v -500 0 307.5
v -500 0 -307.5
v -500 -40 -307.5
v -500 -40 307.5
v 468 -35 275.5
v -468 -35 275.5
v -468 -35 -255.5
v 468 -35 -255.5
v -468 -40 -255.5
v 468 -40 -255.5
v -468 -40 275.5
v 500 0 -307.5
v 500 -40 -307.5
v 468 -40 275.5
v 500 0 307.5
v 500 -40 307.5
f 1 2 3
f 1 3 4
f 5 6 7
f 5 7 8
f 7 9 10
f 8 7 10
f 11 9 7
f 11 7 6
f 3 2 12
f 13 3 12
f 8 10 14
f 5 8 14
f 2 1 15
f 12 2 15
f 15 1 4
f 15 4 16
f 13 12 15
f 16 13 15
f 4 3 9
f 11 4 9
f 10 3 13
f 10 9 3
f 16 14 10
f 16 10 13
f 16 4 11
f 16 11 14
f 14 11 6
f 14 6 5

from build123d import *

# Parameters (mm, degrees)
SKETCH_W     = 1000
SKETCH_H     = 615
PAD_DEPTH    = 40
SKETCH001_W  = 936
SKETCH001_H  = 531
POCKET_DEPTH = 5


with BuildPart() as part:
    # Sketch → Pad (new body)
    with BuildSketch(Plane.XZ):
        Rectangle(SKETCH_W, SKETCH_H)
    extrude(amount=PAD_DEPTH)

    # Sketch001 (on Face6 of Pad) → Pocket (cut)
    with BuildSketch(Plane.XZ.offset(40)):
        with Locations((0, 10)):
            Rectangle(SKETCH001_W, SKETCH001_H)
    extrude(amount=-POCKET_DEPTH, mode=Mode.SUBTRACT)


solid = part.part
